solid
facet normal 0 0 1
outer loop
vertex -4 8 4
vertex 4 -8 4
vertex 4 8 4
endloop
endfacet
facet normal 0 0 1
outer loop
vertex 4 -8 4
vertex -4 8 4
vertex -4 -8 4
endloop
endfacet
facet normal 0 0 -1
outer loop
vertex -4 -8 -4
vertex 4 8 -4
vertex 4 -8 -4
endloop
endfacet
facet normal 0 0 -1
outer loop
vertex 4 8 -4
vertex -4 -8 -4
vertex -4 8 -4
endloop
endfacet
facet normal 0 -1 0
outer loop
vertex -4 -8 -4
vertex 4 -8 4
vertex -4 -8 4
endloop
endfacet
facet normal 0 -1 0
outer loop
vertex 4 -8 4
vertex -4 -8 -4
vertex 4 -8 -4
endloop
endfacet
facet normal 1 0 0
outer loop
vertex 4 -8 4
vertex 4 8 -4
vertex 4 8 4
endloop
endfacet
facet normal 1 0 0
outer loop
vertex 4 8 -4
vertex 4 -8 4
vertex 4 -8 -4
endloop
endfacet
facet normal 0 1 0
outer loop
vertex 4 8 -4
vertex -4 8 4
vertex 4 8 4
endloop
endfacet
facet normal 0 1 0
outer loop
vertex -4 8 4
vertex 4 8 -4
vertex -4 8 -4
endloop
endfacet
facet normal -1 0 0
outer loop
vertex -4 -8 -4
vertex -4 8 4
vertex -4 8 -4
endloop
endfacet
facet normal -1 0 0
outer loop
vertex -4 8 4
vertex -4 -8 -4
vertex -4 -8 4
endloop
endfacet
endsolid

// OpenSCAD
size = 32;//block=32 //item=8




//for(i=[0:1:4]){	//kept as refrence for actualy block shaft positions
//rotate([0,0,90*i]){
//translate([0,size*0.75,0]){
cube([size * 0.25, size * 0.5, size * 0.25], center = true);
//};	//translate
//};	//rotate
//};	//for
